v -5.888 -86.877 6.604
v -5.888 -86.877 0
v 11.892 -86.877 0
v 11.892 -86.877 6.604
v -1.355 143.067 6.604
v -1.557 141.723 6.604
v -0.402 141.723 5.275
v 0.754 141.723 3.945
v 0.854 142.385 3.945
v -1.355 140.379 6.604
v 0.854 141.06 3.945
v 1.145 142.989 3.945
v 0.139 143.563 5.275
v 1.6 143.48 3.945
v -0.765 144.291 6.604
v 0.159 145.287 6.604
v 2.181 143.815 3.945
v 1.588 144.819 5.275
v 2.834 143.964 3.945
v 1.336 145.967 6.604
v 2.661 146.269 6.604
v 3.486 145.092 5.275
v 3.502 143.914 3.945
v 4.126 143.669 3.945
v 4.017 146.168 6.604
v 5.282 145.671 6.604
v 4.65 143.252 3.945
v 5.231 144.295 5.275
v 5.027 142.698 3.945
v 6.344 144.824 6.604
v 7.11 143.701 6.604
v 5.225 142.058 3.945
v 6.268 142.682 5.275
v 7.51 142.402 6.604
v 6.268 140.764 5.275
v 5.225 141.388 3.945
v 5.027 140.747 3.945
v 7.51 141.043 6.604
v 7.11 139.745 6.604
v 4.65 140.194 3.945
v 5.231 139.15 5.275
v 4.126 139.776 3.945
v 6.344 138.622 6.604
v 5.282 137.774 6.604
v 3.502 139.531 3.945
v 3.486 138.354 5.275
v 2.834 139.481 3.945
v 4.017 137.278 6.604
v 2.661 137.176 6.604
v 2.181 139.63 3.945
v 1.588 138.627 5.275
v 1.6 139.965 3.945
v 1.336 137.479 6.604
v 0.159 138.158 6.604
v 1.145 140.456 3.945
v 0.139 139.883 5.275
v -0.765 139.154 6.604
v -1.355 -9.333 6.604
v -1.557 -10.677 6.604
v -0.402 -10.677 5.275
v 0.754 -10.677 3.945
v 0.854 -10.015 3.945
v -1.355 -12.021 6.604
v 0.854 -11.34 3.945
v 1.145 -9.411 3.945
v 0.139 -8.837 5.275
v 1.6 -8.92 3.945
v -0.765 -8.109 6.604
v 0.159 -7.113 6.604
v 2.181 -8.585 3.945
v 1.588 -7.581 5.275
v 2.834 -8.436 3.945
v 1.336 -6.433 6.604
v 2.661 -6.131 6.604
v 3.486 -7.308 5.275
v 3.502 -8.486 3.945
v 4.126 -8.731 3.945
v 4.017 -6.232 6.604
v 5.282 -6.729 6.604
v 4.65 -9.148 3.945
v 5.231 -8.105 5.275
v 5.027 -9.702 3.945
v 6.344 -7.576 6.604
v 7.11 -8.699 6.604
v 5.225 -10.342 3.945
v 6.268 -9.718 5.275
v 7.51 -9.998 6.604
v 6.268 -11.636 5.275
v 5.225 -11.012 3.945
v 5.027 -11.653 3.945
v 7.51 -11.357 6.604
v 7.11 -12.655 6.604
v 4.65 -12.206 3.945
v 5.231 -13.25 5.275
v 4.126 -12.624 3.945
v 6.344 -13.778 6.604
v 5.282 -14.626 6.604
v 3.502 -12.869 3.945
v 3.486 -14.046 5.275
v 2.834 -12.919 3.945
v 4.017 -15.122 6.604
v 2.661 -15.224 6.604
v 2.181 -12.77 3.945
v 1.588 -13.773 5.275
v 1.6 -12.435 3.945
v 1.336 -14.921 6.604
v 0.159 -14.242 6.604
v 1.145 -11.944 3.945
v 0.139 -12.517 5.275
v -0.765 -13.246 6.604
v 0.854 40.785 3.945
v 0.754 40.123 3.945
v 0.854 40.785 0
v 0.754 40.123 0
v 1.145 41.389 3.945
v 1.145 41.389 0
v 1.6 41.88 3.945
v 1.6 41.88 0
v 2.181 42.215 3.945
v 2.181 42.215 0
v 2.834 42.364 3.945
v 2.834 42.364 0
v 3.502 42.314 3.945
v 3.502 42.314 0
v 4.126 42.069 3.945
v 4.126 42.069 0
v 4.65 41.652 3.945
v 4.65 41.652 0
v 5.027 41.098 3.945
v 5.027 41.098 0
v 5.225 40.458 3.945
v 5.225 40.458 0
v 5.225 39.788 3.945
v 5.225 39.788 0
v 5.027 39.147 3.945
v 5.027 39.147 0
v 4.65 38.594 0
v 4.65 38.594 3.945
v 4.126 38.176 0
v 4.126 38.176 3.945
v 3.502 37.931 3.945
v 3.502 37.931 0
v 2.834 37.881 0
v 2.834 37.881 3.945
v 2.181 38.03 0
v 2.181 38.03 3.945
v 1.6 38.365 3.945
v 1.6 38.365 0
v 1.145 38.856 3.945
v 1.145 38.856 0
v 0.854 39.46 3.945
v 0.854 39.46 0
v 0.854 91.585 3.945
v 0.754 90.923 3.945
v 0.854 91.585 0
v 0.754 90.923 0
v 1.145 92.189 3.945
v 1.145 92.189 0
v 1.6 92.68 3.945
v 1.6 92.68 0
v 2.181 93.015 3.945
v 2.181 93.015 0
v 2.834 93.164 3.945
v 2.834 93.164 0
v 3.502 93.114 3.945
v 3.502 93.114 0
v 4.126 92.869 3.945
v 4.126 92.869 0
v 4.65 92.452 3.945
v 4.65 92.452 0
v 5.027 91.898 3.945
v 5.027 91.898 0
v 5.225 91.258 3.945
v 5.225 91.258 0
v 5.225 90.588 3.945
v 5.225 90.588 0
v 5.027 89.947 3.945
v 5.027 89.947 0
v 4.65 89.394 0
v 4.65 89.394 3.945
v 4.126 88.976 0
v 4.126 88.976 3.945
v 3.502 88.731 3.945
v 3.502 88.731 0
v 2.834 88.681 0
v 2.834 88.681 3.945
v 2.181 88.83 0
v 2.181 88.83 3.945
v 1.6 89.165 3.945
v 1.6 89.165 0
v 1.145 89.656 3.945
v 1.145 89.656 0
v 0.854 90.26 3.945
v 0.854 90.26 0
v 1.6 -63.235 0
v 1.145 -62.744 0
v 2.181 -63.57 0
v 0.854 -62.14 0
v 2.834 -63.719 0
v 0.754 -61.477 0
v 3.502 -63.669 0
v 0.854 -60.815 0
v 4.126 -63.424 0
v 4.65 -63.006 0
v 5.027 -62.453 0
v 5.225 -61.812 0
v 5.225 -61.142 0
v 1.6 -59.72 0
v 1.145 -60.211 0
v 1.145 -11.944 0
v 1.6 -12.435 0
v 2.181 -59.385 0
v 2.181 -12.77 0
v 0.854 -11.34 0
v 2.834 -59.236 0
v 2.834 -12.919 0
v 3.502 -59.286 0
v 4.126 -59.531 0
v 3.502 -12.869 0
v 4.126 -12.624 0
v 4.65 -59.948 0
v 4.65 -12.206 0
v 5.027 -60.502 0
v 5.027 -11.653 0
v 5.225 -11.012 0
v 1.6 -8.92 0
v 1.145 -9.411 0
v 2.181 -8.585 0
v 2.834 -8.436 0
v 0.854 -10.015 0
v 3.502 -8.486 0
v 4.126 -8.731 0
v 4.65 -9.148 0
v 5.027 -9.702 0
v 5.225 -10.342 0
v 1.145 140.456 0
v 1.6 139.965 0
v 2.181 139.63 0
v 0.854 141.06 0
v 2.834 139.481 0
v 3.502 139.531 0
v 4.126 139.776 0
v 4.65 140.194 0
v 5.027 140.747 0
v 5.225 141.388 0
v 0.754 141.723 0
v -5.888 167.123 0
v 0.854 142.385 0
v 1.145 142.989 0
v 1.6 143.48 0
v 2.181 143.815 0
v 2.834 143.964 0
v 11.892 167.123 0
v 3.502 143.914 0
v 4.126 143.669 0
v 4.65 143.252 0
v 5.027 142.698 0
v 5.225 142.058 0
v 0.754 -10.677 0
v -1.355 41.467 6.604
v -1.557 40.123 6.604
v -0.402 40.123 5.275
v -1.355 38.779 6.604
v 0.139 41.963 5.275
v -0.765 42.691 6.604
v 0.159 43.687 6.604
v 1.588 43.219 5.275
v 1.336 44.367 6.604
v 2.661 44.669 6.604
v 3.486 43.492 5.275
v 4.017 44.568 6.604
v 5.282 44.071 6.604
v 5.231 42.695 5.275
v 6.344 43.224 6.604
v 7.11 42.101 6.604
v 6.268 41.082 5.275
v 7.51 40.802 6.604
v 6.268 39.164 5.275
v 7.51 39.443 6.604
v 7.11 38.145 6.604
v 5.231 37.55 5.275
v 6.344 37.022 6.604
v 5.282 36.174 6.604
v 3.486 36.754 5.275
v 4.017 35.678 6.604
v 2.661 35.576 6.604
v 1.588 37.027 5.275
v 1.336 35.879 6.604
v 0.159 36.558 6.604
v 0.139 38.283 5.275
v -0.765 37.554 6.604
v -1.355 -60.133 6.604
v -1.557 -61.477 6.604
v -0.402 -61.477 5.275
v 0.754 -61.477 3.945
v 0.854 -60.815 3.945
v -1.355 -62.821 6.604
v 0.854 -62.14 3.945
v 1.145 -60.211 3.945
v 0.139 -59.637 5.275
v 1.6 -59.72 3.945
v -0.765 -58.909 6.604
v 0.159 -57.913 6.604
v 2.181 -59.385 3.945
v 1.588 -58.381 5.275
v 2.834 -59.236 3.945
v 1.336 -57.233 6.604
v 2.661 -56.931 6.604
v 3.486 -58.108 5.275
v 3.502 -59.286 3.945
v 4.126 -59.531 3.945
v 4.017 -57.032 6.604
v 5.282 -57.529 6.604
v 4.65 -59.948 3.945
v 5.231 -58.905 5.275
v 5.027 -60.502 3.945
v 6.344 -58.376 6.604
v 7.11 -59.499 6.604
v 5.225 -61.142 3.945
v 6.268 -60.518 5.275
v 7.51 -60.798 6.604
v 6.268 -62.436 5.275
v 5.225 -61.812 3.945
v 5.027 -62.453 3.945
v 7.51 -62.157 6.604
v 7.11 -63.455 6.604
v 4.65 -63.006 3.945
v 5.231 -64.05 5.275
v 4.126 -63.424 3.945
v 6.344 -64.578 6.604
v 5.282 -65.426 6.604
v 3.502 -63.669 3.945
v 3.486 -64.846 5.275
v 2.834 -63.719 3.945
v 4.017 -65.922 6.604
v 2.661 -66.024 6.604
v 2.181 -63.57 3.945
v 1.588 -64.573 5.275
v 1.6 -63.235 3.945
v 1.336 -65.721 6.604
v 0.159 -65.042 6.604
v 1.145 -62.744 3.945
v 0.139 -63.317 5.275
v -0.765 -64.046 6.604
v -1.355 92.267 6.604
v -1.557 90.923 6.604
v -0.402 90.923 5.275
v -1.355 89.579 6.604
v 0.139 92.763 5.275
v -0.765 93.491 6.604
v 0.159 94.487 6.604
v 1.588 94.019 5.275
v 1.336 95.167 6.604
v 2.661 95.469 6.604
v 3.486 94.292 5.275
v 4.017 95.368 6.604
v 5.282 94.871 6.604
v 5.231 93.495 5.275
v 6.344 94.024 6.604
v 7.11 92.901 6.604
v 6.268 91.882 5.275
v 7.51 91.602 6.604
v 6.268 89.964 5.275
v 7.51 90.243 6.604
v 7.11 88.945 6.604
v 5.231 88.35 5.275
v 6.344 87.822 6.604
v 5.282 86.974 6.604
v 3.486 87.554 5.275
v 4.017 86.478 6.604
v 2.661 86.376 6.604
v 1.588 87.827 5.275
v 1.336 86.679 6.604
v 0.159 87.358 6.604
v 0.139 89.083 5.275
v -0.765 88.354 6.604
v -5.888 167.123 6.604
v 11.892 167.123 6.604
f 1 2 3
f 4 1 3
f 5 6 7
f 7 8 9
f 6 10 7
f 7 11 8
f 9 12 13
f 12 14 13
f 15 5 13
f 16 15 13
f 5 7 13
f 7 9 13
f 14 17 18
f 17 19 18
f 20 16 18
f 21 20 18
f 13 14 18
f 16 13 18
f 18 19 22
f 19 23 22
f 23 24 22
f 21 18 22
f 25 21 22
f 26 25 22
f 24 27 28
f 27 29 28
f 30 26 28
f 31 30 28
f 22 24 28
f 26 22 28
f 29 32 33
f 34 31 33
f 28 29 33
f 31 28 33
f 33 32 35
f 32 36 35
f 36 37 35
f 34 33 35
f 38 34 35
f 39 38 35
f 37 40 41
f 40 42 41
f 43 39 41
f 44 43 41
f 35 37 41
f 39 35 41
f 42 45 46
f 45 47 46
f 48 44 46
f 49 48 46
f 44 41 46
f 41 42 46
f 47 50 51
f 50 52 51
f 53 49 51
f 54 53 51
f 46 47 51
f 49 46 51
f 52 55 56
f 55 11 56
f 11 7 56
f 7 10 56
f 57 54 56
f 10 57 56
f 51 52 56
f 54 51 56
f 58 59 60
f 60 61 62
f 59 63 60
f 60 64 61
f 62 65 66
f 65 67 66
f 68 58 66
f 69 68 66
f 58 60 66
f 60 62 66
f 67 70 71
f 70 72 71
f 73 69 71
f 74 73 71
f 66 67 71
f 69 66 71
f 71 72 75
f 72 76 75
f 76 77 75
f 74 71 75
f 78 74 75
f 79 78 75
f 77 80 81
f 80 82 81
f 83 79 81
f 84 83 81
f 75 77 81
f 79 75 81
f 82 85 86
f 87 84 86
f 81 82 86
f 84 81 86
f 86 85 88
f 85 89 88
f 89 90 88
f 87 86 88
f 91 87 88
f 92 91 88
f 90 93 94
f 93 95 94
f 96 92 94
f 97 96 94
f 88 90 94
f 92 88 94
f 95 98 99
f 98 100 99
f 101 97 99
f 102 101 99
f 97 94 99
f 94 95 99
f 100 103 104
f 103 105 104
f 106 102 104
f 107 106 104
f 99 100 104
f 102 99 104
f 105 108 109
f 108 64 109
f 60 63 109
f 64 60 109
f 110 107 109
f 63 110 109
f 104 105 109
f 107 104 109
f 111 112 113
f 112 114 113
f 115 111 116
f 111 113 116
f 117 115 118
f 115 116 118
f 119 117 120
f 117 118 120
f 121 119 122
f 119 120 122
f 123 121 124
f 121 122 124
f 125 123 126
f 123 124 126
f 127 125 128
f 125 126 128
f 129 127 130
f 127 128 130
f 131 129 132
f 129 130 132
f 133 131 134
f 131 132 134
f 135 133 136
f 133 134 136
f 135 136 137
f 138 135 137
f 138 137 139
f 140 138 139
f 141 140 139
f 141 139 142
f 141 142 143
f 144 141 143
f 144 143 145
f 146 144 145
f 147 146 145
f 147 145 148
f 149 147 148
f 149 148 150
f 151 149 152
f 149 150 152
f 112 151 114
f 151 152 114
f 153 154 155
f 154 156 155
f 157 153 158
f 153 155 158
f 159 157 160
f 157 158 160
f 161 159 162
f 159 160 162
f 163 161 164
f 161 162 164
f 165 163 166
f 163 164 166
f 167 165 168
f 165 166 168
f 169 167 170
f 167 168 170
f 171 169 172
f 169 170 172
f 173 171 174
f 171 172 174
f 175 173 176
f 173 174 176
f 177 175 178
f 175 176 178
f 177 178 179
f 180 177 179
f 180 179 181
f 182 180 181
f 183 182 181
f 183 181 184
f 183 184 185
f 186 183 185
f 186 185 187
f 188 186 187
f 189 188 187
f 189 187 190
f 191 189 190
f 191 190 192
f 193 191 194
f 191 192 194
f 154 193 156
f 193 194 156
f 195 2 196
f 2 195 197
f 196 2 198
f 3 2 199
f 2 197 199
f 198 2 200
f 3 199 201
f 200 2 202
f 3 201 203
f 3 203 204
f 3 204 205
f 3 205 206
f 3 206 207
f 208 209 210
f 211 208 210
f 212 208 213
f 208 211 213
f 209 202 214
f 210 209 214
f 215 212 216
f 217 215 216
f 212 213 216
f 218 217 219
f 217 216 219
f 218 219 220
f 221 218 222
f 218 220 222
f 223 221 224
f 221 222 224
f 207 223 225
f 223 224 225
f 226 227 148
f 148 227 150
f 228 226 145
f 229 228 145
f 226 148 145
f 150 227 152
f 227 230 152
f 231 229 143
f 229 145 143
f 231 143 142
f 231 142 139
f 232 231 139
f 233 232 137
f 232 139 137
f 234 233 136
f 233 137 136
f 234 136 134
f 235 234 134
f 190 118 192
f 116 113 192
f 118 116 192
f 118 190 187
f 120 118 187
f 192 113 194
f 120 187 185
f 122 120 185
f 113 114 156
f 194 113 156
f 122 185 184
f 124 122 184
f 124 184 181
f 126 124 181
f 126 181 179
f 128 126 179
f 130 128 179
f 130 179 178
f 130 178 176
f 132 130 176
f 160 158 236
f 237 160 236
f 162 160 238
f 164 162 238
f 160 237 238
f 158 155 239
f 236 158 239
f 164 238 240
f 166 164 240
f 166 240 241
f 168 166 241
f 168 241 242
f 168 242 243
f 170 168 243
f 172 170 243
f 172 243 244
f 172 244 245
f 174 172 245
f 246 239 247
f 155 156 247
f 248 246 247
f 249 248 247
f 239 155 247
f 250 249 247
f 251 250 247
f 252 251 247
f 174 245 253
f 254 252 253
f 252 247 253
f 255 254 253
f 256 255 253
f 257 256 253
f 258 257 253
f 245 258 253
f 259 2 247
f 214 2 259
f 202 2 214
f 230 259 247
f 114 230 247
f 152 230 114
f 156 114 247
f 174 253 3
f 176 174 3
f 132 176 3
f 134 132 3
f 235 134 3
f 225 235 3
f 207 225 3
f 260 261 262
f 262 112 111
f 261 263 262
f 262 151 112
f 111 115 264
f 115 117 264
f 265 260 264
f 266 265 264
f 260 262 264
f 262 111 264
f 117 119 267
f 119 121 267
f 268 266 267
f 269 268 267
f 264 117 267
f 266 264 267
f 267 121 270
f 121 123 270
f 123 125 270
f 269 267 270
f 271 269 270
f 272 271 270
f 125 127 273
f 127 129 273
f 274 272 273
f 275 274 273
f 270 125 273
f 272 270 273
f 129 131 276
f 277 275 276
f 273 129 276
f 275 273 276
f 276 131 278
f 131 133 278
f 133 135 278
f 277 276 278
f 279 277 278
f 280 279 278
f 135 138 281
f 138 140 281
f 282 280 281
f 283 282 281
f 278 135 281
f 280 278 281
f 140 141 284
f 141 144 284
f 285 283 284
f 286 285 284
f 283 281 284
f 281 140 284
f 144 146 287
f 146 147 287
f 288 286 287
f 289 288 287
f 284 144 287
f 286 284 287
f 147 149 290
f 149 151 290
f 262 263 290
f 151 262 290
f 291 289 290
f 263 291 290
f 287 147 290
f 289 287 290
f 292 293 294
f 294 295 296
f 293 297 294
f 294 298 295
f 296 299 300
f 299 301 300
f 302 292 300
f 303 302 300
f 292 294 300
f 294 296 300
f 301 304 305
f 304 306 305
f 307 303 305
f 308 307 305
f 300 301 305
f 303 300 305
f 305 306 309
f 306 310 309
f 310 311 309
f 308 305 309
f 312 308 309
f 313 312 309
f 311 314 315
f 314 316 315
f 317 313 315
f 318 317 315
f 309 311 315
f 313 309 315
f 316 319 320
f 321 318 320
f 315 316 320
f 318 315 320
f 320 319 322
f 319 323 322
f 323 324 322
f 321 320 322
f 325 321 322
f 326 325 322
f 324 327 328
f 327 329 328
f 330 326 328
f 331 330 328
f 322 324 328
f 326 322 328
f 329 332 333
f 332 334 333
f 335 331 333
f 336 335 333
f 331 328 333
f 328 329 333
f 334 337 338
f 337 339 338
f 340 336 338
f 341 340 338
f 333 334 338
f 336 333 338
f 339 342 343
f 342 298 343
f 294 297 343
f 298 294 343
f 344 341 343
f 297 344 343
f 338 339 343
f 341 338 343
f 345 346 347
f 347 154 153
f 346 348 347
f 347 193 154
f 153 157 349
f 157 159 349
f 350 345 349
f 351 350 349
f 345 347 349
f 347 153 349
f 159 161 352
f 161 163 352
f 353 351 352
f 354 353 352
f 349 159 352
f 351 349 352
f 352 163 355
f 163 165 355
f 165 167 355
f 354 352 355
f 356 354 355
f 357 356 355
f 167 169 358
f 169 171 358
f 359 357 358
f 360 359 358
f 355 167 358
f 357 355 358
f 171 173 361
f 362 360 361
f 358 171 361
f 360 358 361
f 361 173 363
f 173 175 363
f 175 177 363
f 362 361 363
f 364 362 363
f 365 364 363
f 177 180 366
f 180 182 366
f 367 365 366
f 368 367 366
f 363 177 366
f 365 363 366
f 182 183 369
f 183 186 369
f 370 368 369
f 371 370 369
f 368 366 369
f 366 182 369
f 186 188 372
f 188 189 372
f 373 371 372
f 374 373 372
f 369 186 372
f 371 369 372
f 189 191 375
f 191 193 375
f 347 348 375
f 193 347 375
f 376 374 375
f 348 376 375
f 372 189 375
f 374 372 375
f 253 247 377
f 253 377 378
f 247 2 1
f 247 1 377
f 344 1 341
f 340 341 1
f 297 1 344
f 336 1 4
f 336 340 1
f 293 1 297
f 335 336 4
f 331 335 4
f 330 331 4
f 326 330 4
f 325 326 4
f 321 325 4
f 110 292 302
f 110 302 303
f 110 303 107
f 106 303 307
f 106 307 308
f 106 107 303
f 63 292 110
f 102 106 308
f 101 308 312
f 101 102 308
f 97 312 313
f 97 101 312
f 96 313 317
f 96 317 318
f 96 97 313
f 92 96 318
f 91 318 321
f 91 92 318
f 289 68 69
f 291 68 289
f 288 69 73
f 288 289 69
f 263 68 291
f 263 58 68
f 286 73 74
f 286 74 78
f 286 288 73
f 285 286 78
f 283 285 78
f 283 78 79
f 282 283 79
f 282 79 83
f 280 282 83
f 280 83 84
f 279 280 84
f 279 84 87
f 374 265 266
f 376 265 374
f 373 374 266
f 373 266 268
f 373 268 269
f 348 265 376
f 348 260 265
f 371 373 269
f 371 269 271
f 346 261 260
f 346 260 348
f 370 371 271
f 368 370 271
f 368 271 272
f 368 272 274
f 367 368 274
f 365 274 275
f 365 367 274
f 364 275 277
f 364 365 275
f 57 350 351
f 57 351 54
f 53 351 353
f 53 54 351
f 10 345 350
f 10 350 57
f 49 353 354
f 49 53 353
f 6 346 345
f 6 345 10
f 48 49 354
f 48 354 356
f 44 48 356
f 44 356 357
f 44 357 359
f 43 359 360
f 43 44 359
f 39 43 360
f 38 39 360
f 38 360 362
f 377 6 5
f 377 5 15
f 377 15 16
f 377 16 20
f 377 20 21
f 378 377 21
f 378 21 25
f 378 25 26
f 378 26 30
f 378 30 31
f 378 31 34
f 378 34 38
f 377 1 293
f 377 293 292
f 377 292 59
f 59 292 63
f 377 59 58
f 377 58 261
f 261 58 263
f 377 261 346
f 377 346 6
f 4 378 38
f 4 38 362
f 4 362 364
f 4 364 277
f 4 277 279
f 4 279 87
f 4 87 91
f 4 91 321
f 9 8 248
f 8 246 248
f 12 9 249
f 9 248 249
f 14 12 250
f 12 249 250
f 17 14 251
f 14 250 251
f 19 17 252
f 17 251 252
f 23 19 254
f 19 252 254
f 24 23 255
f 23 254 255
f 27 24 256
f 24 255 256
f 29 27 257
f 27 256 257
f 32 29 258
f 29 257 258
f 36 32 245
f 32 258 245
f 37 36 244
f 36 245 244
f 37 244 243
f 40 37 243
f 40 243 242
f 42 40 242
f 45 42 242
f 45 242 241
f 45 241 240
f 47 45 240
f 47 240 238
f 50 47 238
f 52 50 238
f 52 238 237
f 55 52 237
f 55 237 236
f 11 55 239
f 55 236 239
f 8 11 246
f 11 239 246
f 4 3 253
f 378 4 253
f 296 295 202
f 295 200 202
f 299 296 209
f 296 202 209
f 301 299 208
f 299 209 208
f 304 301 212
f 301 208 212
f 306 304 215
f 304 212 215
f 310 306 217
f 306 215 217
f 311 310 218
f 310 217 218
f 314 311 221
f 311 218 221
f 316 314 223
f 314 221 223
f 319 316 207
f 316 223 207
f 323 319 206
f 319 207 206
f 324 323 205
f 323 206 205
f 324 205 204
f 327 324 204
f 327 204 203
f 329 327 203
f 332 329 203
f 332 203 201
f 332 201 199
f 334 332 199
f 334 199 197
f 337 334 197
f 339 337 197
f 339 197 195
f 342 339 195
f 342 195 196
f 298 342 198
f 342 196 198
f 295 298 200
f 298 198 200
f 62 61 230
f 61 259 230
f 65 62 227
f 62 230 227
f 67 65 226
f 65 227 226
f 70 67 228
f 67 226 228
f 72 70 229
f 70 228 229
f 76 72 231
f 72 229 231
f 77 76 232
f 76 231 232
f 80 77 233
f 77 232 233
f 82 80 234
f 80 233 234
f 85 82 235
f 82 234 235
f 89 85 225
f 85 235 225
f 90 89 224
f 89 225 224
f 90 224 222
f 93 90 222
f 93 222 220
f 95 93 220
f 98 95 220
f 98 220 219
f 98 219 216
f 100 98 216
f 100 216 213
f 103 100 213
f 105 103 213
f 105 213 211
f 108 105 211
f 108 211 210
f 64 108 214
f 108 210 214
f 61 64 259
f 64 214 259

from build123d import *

# Parameters (mm, degrees)
F0_W           = 17.78
F0_H           = 254
F1_DEPTH       = 6.604
F3_D           = 4.4958
F3_CSINK_D     = 9.1186
F3_CSINK_ANGLE = 82


with BuildPart() as f1:
    # F0 (on Top) → F1 (new body)
    with BuildSketch(Plane.XY):
        with Locations((3.0019969136, 40.122719574)):
            Rectangle(F0_W, F0_H)
    extrude(amount=F1_DEPTH)

    # F3 (through all)
    with Locations(Plane.XY.offset(6.604)):
        with Locations((3.0019969136, 141.722719574), (3.0019969136, 90.922719574), (3.0019969136, 40.122719574), (3.0019969136, -10.677280426), (3.0019969136, -61.477280426)):
            CounterSinkHole(F3_D / 2, F3_CSINK_D / 2, counter_sink_angle=F3_CSINK_ANGLE)


solid = f1.part
